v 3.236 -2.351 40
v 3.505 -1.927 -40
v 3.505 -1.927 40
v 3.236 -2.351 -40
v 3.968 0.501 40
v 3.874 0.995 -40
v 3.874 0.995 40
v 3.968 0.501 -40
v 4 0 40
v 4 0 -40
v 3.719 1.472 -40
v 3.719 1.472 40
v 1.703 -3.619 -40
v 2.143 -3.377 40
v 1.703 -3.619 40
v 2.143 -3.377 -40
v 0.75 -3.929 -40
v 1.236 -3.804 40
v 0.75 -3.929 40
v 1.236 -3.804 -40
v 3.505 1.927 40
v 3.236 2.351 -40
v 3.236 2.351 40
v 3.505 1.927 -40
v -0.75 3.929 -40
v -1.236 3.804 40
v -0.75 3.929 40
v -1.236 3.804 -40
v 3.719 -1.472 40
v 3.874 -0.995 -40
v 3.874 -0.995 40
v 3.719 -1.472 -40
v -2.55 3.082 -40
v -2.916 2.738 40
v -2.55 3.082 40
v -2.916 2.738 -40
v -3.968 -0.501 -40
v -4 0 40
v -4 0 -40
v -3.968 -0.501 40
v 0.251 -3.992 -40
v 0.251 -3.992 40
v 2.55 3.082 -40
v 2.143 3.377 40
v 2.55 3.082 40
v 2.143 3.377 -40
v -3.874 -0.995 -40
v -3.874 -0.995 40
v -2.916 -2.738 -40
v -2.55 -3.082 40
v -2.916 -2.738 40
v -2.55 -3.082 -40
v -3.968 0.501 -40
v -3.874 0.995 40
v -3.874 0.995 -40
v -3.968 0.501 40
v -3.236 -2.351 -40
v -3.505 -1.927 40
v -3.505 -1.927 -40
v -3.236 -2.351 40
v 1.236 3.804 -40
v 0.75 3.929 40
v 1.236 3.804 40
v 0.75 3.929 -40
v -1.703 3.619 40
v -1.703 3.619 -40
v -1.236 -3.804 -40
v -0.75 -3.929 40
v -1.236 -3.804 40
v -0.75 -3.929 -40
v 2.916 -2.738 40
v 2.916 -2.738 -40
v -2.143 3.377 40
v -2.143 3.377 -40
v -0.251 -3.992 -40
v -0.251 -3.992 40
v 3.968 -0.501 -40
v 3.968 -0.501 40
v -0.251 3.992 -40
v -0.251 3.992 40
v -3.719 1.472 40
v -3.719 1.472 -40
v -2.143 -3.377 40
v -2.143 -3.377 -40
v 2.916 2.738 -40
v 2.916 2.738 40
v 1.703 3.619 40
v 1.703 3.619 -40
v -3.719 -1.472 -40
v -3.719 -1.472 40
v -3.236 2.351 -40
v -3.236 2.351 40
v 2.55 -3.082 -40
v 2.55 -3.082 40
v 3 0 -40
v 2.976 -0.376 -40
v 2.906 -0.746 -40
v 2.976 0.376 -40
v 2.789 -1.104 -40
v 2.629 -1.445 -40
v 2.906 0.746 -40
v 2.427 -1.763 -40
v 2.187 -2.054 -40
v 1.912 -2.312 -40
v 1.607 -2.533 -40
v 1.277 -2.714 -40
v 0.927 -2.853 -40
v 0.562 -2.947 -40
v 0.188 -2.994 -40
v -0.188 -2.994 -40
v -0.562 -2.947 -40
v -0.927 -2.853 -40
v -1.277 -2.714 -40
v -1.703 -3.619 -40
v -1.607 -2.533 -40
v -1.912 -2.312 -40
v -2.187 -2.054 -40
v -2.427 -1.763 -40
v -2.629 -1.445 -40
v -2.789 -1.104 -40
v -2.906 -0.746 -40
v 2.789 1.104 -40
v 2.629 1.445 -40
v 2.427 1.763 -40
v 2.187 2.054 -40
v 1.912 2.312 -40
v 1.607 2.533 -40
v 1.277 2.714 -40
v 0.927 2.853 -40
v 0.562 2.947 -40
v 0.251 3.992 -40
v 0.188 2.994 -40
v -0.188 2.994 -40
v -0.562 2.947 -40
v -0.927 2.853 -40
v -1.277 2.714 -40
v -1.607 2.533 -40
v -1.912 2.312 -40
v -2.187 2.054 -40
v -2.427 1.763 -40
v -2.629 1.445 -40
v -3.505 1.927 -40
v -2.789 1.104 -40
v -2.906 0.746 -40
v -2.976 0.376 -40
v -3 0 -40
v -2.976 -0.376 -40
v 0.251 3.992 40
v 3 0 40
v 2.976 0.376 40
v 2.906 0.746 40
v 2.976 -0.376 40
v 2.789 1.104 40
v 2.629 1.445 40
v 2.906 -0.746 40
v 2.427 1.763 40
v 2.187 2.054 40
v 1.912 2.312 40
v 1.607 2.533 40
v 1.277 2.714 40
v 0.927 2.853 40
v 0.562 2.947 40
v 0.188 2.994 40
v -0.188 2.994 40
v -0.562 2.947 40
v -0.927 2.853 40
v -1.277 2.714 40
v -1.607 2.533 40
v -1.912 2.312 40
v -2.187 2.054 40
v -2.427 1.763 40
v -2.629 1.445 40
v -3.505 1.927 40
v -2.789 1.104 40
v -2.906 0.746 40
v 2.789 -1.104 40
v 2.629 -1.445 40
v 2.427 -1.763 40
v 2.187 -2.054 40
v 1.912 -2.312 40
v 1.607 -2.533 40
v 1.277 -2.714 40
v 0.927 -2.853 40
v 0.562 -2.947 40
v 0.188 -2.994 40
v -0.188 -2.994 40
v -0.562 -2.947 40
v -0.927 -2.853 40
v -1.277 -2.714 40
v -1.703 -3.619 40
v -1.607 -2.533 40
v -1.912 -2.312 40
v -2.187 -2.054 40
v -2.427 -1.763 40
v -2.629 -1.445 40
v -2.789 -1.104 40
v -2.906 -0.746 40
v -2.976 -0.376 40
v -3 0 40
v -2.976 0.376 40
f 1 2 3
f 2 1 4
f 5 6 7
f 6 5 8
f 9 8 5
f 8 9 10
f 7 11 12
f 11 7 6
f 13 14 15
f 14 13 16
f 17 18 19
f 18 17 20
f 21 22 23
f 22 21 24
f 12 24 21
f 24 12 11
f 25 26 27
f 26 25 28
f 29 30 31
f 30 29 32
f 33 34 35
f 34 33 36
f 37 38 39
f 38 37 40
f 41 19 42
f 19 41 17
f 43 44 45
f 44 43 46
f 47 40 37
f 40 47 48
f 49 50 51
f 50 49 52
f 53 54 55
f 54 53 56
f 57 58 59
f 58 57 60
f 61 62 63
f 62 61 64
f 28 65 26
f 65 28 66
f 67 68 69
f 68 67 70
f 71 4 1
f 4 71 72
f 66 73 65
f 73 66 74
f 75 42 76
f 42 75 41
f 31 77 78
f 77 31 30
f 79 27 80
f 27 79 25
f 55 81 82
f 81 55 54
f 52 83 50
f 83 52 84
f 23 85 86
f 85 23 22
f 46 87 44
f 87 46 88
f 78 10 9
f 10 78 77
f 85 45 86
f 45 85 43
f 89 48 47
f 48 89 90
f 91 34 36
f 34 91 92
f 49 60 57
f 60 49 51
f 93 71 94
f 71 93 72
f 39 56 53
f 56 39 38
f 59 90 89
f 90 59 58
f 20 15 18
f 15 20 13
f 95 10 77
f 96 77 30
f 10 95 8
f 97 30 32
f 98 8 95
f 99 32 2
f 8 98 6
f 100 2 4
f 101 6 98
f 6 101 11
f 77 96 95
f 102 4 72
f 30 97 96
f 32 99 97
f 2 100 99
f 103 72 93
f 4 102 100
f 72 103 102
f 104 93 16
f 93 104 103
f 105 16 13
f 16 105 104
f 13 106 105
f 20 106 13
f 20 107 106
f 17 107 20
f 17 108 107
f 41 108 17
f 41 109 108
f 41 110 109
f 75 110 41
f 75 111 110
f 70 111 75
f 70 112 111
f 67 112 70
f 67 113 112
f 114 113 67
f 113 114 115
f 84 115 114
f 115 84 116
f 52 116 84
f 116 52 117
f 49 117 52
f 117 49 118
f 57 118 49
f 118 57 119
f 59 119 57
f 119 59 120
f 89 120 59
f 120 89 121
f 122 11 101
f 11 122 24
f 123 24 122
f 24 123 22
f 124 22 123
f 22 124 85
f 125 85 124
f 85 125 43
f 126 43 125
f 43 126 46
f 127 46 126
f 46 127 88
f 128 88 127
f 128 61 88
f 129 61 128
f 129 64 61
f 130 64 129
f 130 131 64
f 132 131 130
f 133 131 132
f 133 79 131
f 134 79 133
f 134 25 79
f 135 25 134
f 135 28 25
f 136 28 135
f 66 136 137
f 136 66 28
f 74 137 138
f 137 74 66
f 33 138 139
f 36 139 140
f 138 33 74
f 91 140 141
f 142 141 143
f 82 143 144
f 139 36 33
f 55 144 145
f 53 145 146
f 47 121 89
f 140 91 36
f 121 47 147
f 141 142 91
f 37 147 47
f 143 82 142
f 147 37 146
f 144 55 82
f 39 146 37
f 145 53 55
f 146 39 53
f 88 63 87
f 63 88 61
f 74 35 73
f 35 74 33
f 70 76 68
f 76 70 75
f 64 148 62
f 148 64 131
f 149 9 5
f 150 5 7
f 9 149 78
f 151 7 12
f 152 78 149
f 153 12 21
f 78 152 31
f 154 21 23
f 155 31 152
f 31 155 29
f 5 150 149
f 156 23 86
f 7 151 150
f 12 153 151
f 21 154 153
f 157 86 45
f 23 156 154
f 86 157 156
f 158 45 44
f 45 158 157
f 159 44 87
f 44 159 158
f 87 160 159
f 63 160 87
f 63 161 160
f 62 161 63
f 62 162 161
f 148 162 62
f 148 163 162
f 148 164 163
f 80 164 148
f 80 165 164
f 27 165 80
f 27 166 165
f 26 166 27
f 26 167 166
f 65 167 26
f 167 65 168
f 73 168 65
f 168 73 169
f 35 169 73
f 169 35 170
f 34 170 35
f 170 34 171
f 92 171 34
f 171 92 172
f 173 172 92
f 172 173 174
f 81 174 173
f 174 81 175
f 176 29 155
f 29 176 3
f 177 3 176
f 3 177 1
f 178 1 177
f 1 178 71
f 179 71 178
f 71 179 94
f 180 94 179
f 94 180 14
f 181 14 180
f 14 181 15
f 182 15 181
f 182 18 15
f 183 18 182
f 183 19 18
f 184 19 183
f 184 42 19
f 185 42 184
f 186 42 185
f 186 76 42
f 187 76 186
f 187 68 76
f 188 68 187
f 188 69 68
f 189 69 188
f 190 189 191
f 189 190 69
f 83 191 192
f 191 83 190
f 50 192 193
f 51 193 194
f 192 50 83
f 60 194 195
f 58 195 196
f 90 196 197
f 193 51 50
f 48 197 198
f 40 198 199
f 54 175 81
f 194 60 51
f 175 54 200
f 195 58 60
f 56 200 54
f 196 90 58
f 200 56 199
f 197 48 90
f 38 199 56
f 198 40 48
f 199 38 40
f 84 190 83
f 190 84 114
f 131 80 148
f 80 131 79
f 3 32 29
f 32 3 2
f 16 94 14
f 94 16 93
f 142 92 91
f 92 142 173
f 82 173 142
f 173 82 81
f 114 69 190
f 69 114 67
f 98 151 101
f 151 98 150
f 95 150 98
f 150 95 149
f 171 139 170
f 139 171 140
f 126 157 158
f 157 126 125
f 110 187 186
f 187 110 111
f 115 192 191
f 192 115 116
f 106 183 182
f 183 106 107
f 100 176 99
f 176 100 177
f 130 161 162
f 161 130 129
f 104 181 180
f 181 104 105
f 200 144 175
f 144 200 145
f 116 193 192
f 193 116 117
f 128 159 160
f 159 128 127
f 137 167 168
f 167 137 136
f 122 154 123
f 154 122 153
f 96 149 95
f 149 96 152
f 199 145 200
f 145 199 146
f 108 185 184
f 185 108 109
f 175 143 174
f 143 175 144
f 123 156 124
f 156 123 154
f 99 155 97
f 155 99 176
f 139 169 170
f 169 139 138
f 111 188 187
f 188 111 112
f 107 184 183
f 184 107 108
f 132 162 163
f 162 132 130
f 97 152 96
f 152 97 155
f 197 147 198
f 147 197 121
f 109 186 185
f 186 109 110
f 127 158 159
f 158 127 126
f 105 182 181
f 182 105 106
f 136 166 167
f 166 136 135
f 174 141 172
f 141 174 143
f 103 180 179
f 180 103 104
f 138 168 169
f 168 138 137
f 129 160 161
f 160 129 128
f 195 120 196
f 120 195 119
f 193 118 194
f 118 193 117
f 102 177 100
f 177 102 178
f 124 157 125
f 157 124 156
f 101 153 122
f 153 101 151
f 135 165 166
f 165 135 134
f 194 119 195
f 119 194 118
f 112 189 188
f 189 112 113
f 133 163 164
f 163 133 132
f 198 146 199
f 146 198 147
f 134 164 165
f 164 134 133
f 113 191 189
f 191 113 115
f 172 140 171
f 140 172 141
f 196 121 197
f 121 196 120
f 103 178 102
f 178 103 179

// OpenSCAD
$fn = 50;


difference() {
	union() {
		translate(v = [0, 0, -40.0000000000]) {
			cylinder(h = 80, r = 4.0000000000);
		}
	}
	union() {
		translate(v = [0, 0, -100.0000000000]) {
			cylinder(h = 200, r = 3.0000000000);
		}
	}
}
